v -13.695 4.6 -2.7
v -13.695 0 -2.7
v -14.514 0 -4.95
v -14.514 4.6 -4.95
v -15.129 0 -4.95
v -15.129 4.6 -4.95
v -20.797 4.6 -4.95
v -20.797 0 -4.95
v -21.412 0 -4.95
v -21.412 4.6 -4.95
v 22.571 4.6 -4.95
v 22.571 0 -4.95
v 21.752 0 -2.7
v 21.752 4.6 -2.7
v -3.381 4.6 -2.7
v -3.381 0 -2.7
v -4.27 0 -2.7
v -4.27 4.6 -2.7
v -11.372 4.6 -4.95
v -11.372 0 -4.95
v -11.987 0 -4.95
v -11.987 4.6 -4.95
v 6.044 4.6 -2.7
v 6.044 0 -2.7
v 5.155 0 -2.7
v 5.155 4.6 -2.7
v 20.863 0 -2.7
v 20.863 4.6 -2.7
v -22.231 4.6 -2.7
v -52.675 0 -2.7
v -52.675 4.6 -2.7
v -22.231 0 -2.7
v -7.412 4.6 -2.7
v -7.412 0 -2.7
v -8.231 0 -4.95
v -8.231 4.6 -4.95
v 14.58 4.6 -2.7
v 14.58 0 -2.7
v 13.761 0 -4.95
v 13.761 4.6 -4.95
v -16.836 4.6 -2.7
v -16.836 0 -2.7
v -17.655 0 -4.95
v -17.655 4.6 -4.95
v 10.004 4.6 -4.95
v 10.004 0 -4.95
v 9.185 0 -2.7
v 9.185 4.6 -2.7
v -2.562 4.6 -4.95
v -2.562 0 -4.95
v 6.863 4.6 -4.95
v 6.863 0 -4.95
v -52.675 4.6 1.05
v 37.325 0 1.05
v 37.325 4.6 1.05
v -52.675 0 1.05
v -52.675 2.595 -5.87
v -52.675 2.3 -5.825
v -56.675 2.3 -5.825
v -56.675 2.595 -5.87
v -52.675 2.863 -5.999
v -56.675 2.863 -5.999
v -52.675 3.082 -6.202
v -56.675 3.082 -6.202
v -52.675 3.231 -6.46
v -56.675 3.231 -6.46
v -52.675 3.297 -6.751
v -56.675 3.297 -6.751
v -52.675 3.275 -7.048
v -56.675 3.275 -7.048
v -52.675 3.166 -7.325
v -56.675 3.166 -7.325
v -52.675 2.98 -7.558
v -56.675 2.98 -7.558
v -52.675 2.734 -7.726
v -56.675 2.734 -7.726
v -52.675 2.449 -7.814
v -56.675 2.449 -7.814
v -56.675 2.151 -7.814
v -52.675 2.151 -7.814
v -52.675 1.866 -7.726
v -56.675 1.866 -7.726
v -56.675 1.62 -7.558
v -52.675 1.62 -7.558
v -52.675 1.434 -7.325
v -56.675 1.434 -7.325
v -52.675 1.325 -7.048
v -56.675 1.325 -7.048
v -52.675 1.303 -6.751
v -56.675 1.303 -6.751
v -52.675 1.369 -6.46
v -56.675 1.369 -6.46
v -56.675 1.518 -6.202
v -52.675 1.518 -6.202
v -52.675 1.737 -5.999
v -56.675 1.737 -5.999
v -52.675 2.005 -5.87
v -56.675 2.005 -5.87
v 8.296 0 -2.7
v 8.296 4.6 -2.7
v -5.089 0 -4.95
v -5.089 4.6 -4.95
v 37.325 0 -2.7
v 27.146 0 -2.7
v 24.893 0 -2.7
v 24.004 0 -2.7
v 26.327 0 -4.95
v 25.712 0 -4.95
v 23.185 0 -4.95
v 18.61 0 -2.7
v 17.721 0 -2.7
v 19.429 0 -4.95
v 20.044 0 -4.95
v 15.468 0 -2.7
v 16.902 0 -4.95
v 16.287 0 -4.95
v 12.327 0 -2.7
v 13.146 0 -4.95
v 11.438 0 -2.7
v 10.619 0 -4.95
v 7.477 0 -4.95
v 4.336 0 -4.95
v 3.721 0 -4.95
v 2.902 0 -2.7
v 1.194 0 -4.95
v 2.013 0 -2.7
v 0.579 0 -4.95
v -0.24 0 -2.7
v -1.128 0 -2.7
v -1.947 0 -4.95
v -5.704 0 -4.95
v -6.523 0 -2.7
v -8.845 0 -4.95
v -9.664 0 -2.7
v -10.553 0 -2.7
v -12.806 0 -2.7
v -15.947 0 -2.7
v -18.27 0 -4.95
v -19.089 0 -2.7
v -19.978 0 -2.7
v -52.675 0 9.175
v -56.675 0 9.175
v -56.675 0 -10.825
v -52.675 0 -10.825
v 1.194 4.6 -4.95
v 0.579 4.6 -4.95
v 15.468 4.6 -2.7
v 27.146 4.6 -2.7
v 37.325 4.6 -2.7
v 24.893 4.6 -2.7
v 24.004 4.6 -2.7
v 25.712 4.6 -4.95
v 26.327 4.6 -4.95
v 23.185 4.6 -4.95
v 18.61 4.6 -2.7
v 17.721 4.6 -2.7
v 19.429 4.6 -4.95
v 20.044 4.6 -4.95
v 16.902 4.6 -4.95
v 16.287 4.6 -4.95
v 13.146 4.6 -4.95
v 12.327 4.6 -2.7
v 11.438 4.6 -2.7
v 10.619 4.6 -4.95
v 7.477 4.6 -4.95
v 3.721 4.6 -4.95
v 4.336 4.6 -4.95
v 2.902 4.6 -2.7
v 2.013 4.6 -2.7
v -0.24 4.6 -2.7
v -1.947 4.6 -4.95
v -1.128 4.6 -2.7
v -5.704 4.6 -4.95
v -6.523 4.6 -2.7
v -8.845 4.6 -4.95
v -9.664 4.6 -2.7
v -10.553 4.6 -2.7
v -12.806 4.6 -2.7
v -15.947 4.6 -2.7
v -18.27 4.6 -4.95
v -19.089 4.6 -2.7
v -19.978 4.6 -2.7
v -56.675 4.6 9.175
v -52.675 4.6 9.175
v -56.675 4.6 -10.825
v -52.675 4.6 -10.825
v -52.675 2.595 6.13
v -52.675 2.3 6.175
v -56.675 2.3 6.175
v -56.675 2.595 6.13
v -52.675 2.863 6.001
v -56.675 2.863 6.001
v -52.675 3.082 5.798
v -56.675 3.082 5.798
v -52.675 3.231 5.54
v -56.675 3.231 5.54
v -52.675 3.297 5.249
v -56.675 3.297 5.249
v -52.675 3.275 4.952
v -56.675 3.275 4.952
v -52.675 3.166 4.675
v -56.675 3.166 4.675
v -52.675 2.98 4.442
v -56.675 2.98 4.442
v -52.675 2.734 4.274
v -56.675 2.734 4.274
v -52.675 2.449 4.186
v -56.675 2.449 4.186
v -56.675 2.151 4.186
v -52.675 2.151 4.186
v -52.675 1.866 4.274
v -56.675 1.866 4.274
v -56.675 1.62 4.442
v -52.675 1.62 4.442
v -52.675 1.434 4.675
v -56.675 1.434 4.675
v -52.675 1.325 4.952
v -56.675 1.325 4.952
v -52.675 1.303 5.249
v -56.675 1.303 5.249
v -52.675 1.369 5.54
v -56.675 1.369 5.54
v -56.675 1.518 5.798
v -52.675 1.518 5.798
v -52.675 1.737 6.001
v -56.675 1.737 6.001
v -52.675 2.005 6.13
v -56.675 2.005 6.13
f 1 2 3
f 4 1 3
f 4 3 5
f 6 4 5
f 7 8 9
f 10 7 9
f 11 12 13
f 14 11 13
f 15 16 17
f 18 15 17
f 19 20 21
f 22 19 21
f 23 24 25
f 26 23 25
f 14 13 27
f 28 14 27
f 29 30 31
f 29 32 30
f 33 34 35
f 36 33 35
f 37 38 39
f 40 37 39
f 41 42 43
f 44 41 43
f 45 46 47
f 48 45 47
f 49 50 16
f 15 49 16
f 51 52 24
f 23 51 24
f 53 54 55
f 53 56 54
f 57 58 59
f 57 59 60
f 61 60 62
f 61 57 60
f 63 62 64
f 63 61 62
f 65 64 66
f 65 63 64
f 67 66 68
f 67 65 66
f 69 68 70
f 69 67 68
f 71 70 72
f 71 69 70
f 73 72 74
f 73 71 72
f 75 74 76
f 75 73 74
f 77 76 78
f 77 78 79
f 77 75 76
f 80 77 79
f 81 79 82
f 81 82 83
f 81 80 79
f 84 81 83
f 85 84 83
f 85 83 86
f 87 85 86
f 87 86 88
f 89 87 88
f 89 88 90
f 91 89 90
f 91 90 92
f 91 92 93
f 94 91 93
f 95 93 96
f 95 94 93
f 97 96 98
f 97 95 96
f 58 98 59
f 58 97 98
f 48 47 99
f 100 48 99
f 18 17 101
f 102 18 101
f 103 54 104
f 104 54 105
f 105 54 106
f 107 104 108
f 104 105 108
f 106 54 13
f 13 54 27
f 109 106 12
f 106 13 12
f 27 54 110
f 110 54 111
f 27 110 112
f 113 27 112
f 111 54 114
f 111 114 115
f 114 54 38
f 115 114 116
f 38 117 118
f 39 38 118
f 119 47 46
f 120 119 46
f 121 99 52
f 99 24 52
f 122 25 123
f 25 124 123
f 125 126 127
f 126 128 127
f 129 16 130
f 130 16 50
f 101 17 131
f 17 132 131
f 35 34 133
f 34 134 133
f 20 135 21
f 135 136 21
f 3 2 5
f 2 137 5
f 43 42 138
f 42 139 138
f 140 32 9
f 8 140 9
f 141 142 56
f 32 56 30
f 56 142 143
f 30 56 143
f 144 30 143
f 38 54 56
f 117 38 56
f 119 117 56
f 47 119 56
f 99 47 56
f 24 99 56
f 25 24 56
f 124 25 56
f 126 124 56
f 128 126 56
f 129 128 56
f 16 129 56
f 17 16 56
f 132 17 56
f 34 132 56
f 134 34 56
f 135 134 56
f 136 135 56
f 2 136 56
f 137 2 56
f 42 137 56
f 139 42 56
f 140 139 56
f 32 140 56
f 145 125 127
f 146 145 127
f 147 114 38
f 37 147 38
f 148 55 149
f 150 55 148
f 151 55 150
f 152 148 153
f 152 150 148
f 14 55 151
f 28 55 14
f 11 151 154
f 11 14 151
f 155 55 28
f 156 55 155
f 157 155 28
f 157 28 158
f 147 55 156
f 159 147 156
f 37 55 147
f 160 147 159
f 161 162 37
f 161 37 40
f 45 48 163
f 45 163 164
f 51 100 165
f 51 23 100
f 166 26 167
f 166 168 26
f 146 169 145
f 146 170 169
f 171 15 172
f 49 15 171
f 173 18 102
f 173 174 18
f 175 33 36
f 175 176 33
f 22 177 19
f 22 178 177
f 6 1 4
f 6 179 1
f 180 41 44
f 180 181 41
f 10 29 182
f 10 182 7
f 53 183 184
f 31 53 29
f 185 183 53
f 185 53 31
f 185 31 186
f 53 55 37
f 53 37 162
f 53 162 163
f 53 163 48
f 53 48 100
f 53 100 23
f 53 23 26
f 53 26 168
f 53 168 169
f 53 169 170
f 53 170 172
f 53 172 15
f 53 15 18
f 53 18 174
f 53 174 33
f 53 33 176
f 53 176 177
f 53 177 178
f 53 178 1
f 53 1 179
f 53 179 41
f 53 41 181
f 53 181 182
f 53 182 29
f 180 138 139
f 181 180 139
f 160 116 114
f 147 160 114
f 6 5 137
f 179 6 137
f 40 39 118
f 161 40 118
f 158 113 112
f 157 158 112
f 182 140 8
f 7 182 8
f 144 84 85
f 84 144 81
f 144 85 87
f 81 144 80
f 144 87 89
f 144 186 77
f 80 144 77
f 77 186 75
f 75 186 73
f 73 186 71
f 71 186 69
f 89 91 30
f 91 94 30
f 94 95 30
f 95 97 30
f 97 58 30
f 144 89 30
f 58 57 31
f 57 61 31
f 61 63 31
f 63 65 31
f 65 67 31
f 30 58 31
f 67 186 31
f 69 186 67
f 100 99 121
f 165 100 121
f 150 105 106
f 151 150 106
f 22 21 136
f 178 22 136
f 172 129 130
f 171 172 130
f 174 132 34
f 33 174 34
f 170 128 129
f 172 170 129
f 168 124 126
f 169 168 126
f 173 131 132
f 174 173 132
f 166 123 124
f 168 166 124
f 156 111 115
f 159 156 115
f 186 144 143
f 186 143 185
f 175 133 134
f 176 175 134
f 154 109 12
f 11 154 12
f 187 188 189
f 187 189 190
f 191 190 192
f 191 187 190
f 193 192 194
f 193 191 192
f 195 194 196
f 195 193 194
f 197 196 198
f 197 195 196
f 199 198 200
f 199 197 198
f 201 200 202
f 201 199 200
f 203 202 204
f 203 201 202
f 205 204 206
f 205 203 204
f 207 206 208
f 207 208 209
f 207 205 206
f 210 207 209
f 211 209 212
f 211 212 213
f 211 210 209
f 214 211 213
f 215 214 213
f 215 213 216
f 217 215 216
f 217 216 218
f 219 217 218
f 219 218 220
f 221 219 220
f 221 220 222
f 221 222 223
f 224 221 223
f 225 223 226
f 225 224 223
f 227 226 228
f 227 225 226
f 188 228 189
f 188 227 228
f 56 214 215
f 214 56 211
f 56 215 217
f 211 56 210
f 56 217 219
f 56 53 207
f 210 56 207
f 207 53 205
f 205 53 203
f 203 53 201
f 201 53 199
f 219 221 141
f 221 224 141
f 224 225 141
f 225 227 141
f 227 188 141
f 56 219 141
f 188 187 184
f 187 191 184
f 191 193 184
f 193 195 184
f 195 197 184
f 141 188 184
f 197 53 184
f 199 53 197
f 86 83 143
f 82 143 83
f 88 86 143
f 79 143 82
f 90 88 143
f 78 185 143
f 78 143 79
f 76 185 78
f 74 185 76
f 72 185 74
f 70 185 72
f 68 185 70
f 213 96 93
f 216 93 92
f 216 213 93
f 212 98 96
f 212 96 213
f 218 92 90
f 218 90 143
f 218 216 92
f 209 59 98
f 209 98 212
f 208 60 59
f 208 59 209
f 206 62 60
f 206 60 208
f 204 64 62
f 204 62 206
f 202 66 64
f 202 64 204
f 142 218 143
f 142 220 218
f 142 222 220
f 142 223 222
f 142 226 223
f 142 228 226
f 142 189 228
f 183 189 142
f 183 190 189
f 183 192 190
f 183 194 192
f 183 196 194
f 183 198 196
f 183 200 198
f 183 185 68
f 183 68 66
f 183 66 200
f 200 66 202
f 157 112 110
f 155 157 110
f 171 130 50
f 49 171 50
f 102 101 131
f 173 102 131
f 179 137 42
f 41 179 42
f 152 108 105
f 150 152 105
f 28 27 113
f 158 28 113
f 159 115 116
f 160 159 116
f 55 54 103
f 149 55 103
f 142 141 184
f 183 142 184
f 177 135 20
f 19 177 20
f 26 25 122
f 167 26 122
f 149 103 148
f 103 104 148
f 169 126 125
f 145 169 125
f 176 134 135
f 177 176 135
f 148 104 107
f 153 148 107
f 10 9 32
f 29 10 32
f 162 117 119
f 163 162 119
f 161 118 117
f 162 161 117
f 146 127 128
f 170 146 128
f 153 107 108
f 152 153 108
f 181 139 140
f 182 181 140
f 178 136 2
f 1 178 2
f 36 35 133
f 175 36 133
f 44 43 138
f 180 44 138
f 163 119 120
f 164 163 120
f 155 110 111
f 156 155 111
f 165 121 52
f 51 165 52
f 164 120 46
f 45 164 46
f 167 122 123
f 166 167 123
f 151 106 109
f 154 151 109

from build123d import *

# Parameters (mm, degrees)
BOSS_EXTRUDE1_DEPTH  = 4.6
SKETCH11_W           = 3.75
SKETCH11_H           = 4.6
BOSS_EXTRUDE14_DEPTH = 30
SKETCH18_W           = 20
SKETCH18_H           = 4.6
SKETCH18_R           = 1
BOSS_EXTRUDE15_DEPTH = 4
SKETCH19_W           = 3.75
SKETCH19_H           = 4.6
BOSS_EXTRUDE16_DEPTH = 10


with BuildPart() as part:
    # Sketch1 → Boss-Extrude1 (new body)
    with BuildSketch(Plane(origin=(0, 0, 0), x_dir=(1, 0, 0), z_dir=(0, 1, 0))):
        Polygon((27.324900936, 2.700375145), (27.145947966, 2.700375145), (26.327014939, 4.950375145), (25.712159083, 4.950375145), (24.893226056, 2.700375145), (24.004355316, 2.700375145), (23.185422289, 4.950375145), (22.570566433, 4.950375145), (21.751633406, 2.700375145), (20.862762666, 2.700375145), (20.043829639, 4.950375145), (19.428973783, 4.950375145), (18.610040756, 2.700375145), (17.721170016, 2.700375145), (16.902236989, 4.950375145), (16.287381133, 4.950375145), (15.468448106, 2.700375145), (14.579577366, 2.700375145), (13.760644339, 4.950375145), (13.145788483, 4.950375145), (12.326855456, 2.700375145), (11.437984716, 2.700375145), (10.619051689, 4.950375145), (10.004195833, 4.950375145), (9.185262806, 2.700375145), (8.296392066, 2.700375145), (7.477459039, 4.950375145), (6.862603183, 4.950375145), (6.043670156, 2.700375145), (5.154799416, 2.700375145), (4.335866389, 4.950375145), (3.721010533, 4.950375145), (2.902077506, 2.700375145), (2.013206766, 2.700375145), (1.194273739, 4.950375145), (0.579417883, 4.950375145), (-0.239515144, 2.700375145), (-1.128385884, 2.700375145), (-1.947318911, 4.950375145), (-2.562174767, 4.950375145), (-3.381107794, 2.700375145), (-4.269978534, 2.700375145), (-5.088911561, 4.950375145), (-5.703767417, 4.950375145), (-6.522700444, 2.700375145), (-7.411571184, 2.700375145), (-8.230504211, 4.950375145), (-8.845360067, 4.950375145), (-9.664293094, 2.700375145), (-10.553163834, 2.700375145), (-11.372096861, 4.950375145), (-11.986952717, 4.950375145), (-12.805885744, 2.700375145), (-13.694756484, 2.700375145), (-14.513689511, 4.950375145), (-15.128545367, 4.950375145), (-15.947478394, 2.700375145), (-16.836349134, 2.700375145), (-17.655282161, 4.950375145), (-18.270138017, 4.950375145), (-19.089071044, 2.700375145), (-19.977941784, 2.700375145), (-20.796874811, 4.950375145), (-21.411730667, 4.950375145), (-22.230663694, 2.700375145), (-22.675099064, 2.700375145), (-22.675099064, -1.049624855), (27.324900936, -1.049624855), align=None)
    extrude(amount=BOSS_EXTRUDE1_DEPTH)

    # Sketch11 → Boss-Extrude14 (add)
    with BuildSketch(Plane.ZY.offset(22.675099064)):
        with Locations((-0.825375145, 2.3)):
            Rectangle(SKETCH11_W, SKETCH11_H)
    extrude(amount=BOSS_EXTRUDE14_DEPTH)

    # Sketch18 → Boss-Extrude15 (add)
    with BuildSketch(Plane.ZY.offset(52.675099064)):
        with Locations((-0.825375145, 2.3)):
            Rectangle(SKETCH18_W, SKETCH18_H)
        with Locations((5.174624855, 2.3)):
            Circle(SKETCH18_R, mode=Mode.SUBTRACT)
        with Locations((-6.825375145, 2.3)):
            Circle(SKETCH18_R, mode=Mode.SUBTRACT)
    extrude(amount=BOSS_EXTRUDE15_DEPTH)

    # Sketch19 → Boss-Extrude16 (add)
    with BuildSketch(Plane(origin=(27.324900936, 0, 0), x_dir=(0, 0, -1), z_dir=(1, 0, 0))):
        with Locations((0.825375145, 2.3)):
            Rectangle(SKETCH19_W, SKETCH19_H)
    extrude(amount=BOSS_EXTRUDE16_DEPTH)


solid = part.part
